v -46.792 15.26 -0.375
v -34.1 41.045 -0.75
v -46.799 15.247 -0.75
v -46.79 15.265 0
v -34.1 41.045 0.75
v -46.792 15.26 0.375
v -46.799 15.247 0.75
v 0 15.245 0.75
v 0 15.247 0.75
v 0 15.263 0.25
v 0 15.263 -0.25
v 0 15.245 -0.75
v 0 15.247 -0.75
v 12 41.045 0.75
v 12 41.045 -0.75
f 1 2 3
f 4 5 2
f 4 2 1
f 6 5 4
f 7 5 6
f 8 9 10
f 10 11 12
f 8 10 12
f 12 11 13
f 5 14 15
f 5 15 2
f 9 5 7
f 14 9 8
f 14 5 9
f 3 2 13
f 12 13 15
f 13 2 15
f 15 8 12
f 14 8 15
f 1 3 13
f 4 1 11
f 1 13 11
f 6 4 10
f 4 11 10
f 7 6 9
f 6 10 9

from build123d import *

# Parameters (mm, degrees)
BOSS_EXTRUDE1_DEPTH = 0.75
SKETCH2_R           = 15.265
CUT_EXTRUDE1_DEPTH  = 47.8


with BuildPart() as part:
    # Sketch1 → Boss-Extrude1 (new body, symmetric)
    with BuildSketch(Plane.XY):
        Polygon((0, 15.245), (12, 41.045), (-34.1, 41.045), (-46.8, 15.245), align=None)
    extrude(amount=BOSS_EXTRUDE1_DEPTH, both=True)

    # Sketch2 → Cut-Extrude1 (cut, through all)
    with BuildSketch(Plane(origin=(0, 0, 0), x_dir=(0, 0, -1), z_dir=(1, 0, 0))):
        Circle(SKETCH2_R)
    extrude(amount=-CUT_EXTRUDE1_DEPTH, mode=Mode.SUBTRACT)


solid = part.part
